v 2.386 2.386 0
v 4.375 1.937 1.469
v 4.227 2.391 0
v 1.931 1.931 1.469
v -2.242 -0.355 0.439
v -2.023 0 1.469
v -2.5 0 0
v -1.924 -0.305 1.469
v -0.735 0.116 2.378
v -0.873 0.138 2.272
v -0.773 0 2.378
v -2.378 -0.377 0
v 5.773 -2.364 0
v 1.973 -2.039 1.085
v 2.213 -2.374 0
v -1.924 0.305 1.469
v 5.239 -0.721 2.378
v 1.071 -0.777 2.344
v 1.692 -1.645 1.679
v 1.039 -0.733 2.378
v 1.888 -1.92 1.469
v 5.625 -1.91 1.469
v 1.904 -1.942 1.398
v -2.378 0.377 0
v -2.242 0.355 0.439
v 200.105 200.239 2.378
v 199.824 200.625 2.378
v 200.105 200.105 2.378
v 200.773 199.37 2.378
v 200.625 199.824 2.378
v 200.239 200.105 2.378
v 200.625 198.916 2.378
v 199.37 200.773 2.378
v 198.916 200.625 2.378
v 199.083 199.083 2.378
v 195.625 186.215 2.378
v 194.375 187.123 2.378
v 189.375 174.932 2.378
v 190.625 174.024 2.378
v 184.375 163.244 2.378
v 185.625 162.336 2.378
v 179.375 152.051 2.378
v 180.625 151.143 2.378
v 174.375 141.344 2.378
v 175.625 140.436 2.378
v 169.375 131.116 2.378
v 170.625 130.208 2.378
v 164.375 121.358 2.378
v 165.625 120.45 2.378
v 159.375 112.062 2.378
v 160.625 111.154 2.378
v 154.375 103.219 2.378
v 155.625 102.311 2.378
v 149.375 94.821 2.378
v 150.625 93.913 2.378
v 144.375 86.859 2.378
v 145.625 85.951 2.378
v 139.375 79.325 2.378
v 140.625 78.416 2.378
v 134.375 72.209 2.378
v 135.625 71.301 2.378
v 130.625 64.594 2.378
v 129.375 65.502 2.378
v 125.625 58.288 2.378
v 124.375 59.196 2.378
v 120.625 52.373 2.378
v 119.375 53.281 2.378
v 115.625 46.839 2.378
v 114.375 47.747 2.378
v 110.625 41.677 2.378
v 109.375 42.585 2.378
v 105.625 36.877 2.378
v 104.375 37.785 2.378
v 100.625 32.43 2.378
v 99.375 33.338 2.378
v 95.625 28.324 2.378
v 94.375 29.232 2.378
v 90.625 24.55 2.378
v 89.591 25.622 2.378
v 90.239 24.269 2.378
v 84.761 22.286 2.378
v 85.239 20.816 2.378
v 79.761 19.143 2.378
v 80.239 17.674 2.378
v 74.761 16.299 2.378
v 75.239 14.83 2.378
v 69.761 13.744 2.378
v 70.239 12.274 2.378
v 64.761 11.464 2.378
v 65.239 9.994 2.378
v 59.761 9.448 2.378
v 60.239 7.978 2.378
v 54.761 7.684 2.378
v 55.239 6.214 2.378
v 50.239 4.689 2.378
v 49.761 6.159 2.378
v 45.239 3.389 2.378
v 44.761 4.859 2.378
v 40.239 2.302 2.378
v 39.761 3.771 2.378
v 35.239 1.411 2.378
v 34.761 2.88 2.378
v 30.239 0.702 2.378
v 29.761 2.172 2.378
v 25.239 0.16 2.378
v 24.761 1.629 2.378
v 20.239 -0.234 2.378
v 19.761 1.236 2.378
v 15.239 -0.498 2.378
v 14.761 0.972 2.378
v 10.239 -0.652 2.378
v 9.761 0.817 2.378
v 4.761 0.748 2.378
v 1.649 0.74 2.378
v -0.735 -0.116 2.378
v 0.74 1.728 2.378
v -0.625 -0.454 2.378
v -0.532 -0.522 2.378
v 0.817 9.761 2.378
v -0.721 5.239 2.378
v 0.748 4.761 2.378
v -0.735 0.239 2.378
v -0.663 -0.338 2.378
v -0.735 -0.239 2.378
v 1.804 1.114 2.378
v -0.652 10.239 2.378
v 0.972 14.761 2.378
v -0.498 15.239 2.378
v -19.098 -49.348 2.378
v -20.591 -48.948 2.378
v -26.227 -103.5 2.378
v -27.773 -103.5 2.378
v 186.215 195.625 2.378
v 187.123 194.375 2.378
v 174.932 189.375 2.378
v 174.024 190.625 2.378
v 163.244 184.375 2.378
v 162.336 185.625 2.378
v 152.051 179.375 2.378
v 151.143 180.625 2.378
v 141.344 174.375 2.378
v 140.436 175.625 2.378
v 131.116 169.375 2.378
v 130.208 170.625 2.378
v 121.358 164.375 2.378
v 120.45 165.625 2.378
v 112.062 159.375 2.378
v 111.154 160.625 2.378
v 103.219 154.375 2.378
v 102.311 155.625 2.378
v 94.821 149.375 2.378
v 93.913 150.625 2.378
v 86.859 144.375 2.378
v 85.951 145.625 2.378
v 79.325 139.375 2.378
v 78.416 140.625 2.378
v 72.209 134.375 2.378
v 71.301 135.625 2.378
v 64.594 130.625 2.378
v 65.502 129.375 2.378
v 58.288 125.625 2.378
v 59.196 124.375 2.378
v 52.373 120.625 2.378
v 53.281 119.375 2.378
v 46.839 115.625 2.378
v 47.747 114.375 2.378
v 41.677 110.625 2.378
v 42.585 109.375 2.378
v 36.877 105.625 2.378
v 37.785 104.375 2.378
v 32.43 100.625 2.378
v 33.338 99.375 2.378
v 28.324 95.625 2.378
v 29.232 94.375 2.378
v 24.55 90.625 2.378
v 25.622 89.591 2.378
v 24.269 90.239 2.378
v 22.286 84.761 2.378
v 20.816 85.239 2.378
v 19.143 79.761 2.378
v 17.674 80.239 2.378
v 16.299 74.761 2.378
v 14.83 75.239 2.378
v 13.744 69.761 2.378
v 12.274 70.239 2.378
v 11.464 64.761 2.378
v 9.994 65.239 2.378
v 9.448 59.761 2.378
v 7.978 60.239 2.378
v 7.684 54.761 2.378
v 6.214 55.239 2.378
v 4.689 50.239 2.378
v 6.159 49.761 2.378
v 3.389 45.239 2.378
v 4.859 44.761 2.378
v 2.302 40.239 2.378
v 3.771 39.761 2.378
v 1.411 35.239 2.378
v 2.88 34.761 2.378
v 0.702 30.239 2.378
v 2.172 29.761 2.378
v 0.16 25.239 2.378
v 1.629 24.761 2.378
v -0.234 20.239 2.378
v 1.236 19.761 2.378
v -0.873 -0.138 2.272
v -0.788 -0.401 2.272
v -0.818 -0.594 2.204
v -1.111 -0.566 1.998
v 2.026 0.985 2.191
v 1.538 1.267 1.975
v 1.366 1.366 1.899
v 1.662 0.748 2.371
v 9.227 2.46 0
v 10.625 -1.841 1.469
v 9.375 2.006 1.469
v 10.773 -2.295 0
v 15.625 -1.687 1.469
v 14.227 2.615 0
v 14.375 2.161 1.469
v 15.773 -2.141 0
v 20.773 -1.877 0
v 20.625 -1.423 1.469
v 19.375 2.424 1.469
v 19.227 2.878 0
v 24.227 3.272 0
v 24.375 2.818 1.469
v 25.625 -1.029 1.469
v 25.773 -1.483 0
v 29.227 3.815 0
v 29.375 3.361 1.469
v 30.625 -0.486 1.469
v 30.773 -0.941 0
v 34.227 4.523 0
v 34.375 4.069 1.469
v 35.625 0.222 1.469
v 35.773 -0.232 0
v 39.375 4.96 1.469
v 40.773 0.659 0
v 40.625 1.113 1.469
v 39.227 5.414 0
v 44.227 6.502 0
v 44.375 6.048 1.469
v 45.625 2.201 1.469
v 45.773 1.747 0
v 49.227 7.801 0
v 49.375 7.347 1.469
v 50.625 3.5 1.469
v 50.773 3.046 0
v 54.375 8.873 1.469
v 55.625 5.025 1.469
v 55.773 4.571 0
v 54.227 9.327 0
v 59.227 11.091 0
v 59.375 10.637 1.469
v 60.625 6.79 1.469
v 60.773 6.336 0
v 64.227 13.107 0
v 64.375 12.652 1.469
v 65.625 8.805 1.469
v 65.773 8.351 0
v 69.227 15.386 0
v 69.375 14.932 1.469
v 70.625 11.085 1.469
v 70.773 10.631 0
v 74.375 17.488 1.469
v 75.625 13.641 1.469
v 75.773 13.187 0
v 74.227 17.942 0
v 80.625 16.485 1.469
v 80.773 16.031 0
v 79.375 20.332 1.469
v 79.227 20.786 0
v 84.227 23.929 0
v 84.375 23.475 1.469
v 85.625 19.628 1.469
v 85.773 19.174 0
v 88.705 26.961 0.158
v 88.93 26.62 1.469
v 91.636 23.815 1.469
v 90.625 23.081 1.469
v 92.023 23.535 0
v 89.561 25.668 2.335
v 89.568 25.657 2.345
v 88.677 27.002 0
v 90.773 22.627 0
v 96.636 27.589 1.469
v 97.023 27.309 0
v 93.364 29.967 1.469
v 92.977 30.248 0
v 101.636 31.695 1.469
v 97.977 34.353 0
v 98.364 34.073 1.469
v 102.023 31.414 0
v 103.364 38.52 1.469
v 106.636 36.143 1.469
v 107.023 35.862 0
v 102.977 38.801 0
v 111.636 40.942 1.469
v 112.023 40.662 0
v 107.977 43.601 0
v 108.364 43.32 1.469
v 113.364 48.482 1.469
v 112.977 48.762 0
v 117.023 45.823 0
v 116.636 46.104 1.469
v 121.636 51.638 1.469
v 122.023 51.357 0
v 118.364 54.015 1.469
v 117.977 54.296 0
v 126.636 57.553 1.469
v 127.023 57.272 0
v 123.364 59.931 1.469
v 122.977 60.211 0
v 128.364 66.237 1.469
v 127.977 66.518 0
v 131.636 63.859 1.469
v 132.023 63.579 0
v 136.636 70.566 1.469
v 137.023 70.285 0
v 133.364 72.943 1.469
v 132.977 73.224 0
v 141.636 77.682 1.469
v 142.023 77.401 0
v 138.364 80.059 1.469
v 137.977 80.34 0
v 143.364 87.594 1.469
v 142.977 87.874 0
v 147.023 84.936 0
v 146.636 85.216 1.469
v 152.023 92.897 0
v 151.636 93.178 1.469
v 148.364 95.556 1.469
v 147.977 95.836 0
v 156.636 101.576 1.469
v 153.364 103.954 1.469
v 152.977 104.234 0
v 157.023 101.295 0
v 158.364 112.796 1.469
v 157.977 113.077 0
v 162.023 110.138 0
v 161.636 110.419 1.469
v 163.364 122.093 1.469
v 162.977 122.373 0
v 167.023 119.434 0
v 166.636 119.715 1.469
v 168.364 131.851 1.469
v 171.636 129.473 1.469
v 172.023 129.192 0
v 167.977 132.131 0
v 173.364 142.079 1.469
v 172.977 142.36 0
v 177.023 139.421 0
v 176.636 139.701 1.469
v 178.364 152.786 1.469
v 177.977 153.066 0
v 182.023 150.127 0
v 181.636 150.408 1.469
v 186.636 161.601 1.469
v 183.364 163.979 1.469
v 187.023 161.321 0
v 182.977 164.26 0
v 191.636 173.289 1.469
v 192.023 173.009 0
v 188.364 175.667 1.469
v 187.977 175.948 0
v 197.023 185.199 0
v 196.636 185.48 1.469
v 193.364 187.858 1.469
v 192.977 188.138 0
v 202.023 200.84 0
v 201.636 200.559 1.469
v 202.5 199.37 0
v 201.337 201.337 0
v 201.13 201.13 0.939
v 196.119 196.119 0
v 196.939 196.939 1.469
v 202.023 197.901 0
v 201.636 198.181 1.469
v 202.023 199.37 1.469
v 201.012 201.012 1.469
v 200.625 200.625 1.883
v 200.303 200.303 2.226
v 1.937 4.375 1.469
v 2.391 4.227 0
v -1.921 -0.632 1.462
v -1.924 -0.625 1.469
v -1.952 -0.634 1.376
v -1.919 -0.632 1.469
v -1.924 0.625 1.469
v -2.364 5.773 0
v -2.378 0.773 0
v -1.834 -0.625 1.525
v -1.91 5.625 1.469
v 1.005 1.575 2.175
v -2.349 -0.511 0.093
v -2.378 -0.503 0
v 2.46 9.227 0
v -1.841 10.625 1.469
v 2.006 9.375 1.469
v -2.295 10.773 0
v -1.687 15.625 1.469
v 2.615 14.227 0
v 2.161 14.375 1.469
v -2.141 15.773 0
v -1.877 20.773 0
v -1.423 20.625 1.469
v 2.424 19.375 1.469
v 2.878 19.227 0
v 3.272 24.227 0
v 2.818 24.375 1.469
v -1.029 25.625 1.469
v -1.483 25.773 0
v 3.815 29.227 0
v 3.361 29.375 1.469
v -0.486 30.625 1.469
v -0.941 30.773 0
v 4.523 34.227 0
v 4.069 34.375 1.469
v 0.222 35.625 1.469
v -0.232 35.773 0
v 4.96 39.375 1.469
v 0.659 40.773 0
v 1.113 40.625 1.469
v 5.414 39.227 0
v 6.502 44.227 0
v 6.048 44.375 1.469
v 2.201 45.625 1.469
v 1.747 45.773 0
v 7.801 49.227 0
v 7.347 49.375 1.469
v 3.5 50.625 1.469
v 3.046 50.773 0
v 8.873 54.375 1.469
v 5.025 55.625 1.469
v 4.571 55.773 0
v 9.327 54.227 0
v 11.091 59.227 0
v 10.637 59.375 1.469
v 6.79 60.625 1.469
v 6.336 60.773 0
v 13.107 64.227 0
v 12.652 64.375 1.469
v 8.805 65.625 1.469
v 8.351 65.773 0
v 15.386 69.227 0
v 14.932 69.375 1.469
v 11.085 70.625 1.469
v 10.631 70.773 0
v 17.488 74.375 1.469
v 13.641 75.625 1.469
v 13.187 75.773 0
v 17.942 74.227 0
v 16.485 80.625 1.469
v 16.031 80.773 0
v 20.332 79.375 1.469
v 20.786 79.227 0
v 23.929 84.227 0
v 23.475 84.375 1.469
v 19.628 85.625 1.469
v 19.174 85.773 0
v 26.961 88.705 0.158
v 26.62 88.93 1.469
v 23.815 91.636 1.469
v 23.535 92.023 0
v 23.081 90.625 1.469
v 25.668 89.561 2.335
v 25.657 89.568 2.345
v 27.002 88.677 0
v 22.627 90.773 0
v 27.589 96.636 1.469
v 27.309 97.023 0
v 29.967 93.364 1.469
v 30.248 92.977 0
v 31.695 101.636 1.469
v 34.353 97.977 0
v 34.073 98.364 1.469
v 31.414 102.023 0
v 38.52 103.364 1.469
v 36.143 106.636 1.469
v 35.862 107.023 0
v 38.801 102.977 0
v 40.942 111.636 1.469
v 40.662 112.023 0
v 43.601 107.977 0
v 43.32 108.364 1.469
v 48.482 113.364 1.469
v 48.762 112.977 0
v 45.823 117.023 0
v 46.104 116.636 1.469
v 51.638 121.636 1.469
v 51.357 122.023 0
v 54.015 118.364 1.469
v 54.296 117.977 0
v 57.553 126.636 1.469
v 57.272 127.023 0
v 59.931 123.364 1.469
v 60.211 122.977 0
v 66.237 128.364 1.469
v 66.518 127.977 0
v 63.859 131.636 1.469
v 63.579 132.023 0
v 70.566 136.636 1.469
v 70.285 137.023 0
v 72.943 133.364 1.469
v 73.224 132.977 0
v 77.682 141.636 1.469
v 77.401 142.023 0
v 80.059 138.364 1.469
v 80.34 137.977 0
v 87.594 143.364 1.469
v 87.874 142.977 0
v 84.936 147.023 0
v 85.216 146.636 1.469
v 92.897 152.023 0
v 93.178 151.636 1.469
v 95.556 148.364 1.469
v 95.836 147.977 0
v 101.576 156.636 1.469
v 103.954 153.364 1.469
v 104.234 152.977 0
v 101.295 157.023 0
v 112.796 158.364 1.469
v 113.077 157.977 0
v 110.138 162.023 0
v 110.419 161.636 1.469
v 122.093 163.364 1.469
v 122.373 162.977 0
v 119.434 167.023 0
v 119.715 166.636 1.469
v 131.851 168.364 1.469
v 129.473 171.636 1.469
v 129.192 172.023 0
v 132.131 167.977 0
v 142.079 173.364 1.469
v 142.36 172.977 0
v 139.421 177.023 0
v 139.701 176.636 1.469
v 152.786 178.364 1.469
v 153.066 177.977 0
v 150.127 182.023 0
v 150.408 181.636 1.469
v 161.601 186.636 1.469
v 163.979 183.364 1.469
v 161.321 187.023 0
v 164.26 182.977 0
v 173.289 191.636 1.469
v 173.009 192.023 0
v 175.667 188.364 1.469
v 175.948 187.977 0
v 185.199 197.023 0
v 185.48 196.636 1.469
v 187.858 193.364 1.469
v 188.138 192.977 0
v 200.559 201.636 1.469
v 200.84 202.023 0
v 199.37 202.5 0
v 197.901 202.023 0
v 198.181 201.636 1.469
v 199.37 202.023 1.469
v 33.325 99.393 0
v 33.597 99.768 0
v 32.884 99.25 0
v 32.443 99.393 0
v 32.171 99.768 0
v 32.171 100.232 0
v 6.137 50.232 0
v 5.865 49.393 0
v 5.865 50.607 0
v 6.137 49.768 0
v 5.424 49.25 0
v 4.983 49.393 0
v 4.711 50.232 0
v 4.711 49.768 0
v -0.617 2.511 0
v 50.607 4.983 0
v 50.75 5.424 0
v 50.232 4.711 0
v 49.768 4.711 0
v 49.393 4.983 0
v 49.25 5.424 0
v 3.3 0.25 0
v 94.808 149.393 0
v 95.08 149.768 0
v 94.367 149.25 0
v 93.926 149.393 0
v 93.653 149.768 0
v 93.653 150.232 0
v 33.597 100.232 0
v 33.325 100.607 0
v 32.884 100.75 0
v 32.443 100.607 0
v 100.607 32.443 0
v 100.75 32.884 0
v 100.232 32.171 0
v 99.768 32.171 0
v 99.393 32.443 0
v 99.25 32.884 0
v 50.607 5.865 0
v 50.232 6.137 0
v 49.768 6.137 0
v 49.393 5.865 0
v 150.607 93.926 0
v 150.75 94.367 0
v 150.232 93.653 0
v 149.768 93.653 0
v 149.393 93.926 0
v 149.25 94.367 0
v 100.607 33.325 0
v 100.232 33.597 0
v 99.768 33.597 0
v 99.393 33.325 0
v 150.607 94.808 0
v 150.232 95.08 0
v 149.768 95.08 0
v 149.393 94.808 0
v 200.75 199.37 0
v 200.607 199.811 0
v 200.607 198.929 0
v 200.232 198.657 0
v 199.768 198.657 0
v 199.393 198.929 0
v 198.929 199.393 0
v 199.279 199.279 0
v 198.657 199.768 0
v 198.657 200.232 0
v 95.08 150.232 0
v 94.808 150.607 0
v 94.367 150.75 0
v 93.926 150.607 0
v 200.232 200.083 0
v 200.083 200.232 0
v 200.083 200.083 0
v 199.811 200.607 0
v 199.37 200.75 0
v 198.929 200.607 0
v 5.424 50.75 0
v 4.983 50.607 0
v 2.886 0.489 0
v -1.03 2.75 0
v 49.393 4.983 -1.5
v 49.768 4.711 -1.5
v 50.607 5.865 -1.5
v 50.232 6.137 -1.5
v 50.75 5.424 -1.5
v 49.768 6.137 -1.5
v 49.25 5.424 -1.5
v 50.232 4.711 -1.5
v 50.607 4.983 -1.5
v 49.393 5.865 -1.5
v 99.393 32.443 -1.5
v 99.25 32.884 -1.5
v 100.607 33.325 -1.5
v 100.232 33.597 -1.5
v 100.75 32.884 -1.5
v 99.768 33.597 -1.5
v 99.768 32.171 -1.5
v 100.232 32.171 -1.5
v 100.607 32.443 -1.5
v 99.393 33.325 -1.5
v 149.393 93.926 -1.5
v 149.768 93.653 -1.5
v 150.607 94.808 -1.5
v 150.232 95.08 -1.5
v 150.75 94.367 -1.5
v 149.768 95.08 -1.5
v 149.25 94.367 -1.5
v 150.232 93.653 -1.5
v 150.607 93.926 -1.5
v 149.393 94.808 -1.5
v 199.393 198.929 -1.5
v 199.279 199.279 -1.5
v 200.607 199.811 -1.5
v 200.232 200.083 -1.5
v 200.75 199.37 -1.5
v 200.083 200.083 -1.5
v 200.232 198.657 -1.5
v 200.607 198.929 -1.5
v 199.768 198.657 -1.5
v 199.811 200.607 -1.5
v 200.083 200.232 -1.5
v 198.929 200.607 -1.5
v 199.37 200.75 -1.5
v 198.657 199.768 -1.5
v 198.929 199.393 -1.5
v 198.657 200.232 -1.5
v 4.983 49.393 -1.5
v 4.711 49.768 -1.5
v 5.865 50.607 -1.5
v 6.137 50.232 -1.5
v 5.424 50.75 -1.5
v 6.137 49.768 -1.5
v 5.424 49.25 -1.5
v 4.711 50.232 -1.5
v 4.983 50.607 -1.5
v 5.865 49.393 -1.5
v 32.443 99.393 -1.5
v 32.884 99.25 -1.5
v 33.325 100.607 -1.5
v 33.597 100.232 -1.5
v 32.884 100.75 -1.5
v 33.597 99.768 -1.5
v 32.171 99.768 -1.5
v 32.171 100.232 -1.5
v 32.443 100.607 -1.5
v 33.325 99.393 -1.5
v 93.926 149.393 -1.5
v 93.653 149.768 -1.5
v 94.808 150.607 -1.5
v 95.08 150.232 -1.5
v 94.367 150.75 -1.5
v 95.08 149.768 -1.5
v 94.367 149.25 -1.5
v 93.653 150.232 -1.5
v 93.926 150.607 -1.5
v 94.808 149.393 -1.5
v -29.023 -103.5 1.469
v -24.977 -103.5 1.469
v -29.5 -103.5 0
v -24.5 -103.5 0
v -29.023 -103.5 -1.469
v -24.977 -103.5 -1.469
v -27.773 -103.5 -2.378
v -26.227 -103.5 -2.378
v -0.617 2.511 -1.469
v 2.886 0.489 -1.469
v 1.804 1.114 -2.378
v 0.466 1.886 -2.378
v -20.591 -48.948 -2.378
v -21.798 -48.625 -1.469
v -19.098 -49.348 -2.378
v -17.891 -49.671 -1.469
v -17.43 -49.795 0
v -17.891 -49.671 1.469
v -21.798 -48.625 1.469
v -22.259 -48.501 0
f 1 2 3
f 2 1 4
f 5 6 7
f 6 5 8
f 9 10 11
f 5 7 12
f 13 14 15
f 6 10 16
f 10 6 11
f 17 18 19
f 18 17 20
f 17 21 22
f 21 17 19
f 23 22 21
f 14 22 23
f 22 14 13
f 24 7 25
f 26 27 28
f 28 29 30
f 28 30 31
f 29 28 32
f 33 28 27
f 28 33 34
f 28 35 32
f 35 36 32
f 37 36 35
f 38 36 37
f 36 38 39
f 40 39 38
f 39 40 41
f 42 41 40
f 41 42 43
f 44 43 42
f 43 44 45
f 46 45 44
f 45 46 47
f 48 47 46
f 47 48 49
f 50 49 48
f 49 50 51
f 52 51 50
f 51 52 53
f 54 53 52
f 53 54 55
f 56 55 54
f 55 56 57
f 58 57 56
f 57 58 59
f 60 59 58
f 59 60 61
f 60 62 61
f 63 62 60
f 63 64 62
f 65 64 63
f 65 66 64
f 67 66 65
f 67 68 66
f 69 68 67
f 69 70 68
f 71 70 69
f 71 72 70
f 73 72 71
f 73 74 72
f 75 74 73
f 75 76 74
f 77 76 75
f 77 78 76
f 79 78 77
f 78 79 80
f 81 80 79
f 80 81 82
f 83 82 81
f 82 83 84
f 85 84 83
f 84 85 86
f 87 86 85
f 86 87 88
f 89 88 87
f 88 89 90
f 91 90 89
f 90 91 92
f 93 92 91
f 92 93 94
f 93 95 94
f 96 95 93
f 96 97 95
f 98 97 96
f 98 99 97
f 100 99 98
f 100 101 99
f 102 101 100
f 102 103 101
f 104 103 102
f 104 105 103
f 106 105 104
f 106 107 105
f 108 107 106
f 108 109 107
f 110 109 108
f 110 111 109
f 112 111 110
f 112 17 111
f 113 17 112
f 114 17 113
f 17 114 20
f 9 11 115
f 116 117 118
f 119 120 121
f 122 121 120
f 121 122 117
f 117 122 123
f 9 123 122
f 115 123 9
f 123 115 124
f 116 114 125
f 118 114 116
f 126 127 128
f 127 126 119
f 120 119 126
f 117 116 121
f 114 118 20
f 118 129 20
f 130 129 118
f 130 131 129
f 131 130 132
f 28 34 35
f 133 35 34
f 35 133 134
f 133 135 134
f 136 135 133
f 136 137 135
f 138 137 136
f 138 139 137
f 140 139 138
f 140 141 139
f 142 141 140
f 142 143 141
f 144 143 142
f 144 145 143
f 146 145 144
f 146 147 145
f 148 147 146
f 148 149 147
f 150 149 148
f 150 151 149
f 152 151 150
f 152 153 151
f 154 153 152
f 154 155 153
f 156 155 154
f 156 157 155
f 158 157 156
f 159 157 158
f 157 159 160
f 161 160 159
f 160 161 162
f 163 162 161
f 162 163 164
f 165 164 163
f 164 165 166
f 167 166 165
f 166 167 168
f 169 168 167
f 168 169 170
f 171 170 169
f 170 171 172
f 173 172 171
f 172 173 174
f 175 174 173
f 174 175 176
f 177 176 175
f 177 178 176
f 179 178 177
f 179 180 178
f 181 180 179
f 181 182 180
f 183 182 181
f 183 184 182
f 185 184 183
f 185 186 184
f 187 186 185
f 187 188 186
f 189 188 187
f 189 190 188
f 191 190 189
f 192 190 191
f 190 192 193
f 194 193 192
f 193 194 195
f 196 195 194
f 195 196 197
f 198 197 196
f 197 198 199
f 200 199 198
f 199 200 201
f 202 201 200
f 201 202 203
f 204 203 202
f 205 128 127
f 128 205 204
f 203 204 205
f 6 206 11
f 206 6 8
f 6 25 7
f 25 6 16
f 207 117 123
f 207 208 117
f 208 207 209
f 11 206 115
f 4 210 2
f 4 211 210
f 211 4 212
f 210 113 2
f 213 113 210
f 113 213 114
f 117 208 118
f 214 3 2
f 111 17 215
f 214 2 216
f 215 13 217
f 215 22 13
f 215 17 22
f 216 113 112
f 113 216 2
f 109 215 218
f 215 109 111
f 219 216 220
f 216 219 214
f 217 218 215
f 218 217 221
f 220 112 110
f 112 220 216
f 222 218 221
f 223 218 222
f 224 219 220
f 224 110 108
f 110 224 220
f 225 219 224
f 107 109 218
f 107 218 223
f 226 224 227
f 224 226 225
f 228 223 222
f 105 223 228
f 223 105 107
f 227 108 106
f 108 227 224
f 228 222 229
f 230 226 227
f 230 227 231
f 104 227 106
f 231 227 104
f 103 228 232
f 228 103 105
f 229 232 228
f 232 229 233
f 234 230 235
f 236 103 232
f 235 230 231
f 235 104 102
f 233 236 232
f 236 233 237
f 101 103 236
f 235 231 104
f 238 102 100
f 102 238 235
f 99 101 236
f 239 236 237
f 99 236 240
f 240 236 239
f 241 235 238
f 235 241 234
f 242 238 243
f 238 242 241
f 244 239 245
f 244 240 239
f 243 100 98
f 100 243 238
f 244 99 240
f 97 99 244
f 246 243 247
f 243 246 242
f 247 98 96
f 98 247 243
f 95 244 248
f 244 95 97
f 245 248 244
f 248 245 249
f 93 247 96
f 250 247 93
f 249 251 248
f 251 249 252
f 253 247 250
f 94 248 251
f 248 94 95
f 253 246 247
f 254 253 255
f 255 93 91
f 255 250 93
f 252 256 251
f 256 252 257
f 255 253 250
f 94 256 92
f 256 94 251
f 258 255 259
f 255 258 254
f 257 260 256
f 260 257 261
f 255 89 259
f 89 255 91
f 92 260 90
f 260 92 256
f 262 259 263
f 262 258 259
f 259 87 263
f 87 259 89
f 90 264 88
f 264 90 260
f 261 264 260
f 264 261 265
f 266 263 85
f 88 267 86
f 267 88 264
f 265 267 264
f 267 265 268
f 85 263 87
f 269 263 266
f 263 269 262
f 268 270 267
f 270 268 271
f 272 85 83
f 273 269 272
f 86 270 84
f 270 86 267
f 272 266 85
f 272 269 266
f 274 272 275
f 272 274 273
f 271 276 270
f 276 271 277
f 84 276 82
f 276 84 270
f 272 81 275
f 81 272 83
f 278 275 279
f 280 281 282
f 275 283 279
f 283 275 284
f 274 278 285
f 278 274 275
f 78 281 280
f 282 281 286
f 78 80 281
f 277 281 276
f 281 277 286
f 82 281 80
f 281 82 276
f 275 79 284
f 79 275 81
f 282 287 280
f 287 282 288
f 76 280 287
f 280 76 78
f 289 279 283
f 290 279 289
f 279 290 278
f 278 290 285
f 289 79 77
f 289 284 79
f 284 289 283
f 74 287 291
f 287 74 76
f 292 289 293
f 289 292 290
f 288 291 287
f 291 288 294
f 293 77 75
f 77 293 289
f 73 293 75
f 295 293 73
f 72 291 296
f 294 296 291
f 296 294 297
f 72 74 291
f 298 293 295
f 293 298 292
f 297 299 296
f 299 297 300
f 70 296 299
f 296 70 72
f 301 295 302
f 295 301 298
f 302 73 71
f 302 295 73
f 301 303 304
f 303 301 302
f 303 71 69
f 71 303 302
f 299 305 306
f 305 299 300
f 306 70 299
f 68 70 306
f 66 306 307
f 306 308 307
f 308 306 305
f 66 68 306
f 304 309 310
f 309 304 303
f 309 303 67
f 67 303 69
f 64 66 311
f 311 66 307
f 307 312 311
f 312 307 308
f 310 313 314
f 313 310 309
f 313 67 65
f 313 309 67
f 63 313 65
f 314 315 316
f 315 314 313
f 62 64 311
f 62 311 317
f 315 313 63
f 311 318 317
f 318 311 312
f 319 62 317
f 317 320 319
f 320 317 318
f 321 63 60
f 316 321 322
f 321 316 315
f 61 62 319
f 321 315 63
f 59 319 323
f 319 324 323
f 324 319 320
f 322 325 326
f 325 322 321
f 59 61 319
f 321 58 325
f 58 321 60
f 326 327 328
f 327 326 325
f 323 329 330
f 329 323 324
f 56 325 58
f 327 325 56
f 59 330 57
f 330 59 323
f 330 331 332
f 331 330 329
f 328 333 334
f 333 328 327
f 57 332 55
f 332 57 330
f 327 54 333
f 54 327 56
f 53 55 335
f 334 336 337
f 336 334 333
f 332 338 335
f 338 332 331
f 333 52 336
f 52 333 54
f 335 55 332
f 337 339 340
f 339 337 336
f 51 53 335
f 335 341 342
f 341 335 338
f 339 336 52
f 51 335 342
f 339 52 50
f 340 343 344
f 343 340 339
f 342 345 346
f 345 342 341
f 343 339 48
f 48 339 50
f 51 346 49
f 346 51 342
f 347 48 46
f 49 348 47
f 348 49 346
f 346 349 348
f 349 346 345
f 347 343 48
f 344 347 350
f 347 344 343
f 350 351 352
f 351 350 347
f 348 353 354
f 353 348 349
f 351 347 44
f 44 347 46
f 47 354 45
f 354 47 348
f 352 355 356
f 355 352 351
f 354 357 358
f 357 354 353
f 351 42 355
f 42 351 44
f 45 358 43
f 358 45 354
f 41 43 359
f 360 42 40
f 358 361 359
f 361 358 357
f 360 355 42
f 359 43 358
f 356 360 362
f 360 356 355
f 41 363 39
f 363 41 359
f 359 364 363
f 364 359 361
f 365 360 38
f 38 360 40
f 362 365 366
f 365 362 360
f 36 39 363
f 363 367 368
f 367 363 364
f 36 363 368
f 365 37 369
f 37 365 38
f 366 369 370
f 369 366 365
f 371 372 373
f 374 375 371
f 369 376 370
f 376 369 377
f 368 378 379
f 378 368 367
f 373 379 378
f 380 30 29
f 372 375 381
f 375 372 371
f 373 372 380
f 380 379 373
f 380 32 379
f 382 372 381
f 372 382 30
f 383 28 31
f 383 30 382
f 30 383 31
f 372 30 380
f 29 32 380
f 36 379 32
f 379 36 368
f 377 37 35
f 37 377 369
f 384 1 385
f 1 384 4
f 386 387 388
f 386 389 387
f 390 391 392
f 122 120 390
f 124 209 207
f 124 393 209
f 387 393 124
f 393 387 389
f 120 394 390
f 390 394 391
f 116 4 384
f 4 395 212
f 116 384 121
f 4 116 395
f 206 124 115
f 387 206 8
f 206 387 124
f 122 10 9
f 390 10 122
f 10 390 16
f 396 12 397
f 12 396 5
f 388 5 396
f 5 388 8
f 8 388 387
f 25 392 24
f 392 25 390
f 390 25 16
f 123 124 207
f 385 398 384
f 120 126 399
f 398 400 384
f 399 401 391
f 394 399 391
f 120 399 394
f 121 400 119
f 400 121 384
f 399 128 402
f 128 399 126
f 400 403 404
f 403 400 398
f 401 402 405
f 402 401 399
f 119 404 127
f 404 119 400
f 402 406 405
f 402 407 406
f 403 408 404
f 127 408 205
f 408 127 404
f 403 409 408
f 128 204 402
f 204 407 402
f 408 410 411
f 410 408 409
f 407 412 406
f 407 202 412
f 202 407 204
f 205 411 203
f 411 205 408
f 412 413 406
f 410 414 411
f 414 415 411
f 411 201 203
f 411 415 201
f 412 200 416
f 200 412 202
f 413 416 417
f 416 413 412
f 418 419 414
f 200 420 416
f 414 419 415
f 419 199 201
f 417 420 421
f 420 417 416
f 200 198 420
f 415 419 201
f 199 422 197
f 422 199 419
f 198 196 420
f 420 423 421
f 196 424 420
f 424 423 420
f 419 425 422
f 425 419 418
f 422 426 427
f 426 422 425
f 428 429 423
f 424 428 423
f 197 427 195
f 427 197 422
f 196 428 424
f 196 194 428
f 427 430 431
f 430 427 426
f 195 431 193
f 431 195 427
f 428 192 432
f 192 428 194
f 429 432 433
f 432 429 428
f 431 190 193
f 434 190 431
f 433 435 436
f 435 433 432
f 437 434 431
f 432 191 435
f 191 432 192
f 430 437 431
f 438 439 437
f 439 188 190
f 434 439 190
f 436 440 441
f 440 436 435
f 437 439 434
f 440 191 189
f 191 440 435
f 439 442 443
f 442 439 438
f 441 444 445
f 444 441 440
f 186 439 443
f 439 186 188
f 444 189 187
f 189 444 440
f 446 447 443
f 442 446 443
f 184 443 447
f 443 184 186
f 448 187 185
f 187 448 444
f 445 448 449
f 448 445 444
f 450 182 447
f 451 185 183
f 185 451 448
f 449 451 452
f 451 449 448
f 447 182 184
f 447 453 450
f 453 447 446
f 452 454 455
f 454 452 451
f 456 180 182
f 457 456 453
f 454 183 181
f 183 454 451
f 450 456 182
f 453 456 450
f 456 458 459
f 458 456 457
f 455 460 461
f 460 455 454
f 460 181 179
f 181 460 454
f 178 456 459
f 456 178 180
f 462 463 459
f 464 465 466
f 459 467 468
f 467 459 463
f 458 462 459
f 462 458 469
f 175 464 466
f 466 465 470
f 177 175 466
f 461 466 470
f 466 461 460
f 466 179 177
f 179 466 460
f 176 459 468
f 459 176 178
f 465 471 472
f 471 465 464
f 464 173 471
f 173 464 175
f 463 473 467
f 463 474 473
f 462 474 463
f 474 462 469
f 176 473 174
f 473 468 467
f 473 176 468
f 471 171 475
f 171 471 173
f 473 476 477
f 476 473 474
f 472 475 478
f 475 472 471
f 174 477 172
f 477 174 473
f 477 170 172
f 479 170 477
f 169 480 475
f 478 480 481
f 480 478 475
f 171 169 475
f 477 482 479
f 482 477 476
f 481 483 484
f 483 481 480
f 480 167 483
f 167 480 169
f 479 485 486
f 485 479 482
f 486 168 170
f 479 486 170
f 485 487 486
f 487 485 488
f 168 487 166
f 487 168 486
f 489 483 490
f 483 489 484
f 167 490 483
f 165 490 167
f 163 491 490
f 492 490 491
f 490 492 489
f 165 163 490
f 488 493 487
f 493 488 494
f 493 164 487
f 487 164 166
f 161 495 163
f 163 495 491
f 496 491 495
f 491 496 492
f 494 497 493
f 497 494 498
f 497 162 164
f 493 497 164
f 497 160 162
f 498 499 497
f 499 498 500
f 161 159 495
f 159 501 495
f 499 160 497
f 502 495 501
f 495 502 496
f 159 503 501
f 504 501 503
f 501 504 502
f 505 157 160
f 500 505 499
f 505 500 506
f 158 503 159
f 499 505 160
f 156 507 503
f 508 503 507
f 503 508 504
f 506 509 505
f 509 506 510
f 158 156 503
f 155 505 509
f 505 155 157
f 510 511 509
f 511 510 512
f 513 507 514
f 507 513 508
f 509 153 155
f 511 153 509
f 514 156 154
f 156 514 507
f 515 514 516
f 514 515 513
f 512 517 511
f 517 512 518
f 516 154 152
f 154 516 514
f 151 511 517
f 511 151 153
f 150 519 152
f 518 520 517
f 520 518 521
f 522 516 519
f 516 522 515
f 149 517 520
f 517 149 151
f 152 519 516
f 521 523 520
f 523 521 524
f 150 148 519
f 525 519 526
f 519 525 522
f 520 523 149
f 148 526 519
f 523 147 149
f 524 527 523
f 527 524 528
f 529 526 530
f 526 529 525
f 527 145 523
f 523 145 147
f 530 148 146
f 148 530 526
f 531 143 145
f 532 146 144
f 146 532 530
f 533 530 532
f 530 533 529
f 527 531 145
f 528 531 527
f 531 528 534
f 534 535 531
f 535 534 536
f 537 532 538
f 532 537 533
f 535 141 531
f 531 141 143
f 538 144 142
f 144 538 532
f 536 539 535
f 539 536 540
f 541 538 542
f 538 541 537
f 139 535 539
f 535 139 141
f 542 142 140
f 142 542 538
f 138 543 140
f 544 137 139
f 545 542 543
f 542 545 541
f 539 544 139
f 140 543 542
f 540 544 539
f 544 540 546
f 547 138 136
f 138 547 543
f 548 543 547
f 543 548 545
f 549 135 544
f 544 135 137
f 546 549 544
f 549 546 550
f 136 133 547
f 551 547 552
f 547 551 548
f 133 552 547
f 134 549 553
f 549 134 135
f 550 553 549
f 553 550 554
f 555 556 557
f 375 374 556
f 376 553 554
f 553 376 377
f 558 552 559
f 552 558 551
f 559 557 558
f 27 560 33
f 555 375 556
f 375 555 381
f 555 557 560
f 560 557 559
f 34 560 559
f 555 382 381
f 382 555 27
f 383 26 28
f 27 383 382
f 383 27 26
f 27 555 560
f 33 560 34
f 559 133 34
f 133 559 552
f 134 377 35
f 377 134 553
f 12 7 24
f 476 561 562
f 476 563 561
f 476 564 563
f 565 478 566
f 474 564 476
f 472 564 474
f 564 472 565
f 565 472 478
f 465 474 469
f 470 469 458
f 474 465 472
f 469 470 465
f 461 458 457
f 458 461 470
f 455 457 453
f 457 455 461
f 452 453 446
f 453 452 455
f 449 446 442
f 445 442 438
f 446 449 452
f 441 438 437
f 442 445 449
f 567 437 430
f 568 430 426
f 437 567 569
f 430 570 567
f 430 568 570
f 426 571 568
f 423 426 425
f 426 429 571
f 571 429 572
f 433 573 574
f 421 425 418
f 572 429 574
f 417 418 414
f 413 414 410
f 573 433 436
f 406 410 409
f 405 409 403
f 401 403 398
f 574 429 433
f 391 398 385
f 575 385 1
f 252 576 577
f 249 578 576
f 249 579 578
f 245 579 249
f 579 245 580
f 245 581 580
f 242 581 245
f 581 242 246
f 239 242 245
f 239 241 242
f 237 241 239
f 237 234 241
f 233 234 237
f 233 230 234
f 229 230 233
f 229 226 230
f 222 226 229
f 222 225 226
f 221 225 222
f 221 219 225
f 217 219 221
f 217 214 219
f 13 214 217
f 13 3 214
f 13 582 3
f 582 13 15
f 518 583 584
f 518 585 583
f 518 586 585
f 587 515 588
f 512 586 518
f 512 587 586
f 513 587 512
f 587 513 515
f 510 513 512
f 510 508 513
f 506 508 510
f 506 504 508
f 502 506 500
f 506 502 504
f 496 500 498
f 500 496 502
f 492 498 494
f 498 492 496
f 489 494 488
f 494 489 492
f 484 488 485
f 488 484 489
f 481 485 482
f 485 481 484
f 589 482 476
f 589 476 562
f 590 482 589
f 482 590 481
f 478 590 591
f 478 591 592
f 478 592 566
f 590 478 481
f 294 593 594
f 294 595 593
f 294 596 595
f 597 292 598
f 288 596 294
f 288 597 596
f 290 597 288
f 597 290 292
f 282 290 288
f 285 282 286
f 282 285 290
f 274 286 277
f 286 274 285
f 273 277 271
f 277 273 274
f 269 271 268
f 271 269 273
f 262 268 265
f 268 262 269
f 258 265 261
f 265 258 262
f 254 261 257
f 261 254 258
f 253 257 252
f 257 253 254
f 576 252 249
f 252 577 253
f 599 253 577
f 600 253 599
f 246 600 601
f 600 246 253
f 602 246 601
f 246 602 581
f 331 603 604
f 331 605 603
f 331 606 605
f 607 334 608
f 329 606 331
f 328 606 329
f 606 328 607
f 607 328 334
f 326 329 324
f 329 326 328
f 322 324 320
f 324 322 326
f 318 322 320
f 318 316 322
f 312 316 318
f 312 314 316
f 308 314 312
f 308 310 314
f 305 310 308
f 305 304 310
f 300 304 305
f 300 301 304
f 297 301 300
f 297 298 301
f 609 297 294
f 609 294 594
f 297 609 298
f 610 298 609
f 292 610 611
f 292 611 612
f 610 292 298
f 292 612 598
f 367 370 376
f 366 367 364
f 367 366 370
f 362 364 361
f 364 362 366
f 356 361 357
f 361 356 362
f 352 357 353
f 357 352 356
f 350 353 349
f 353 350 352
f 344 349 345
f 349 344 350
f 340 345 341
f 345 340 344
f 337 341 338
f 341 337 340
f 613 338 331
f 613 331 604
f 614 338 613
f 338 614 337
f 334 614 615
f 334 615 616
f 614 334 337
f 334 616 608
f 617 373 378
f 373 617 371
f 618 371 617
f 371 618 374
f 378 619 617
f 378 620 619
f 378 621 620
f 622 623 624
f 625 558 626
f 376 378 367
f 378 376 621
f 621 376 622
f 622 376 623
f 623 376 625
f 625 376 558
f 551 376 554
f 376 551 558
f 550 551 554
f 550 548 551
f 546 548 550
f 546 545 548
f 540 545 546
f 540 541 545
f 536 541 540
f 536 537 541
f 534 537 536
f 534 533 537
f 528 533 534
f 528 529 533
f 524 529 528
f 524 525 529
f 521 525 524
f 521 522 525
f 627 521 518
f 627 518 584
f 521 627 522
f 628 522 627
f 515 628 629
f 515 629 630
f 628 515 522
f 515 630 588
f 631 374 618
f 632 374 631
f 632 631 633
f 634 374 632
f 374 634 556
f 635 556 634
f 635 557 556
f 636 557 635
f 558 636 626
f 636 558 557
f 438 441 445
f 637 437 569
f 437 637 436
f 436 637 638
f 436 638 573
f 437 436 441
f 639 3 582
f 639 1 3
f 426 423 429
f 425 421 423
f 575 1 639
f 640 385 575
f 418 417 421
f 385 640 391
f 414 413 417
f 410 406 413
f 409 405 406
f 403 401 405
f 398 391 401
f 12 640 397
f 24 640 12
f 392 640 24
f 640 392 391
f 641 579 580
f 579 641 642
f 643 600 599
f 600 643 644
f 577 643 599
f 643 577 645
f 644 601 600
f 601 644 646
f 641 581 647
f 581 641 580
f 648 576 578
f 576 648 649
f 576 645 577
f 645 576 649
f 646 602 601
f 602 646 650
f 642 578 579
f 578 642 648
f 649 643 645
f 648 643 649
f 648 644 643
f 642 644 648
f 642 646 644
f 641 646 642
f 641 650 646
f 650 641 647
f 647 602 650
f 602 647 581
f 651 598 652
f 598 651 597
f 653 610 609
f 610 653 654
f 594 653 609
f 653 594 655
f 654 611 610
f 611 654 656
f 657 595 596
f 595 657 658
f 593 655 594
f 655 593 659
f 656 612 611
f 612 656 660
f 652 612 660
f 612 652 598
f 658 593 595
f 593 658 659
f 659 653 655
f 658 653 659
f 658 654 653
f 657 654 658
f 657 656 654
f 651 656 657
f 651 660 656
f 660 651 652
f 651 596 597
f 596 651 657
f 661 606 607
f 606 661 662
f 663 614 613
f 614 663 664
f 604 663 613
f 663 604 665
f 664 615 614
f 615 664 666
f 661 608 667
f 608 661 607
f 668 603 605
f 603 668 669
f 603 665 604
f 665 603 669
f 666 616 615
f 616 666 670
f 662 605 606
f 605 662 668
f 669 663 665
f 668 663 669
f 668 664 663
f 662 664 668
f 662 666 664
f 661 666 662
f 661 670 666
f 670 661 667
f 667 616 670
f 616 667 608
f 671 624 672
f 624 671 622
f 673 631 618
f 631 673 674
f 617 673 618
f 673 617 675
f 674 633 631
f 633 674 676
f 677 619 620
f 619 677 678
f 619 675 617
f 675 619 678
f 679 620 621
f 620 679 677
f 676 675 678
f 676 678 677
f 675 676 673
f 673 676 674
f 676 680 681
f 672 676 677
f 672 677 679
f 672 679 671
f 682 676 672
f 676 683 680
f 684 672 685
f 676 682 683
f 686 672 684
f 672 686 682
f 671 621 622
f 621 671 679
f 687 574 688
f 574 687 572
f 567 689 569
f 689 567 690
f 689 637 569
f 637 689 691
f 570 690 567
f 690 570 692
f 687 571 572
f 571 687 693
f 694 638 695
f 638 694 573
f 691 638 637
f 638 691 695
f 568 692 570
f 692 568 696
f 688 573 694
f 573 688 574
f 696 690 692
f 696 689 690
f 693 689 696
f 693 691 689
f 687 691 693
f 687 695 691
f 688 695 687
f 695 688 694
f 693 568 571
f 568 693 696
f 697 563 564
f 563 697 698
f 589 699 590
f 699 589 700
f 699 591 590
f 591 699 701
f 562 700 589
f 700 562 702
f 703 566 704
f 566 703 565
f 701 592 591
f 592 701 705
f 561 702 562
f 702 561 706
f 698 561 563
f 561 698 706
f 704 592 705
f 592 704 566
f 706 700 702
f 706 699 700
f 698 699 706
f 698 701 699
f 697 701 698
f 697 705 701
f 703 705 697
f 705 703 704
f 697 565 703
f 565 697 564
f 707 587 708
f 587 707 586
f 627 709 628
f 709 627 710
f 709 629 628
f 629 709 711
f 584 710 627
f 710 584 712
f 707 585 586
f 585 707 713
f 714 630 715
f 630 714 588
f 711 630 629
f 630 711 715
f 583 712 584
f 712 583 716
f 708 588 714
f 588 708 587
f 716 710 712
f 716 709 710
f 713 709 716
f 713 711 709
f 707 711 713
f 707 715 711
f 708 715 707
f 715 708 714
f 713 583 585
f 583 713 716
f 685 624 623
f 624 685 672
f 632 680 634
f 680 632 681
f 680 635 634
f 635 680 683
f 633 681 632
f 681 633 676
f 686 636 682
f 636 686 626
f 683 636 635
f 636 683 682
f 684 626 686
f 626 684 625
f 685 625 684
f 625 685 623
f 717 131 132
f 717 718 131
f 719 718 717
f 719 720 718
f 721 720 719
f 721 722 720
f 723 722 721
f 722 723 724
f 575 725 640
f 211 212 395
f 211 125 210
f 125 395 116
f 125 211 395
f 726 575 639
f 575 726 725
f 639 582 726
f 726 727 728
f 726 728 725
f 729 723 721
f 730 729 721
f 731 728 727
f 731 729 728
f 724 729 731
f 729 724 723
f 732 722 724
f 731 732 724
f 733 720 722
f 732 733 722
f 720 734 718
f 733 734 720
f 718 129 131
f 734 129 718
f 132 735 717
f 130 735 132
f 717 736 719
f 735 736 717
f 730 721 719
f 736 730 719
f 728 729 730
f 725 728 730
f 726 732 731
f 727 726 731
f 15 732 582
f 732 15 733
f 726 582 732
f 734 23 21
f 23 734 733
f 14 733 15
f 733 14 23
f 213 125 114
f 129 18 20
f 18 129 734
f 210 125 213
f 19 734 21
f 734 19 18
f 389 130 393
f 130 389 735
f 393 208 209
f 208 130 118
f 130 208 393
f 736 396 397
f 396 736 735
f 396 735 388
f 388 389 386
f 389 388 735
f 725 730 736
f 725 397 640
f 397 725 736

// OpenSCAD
resolution = 10;
module edge(){  
    for (x=[0:39]){
        y = x^2.6/367;
        hull(){
        translate([x,y])
//            circle
            sphere(d=1,$fn=resolution);
        x2 = x+1;
        y2 = (x+1)^2.6/367;
        translate([x2,y2])
//            circle
            sphere(d=1,$fn=resolution); 
        }
    }
}

module leaf(){
    difference(){
        union(){    
            edge();
            mirror([-1,1]) 
                edge(); 
        }
        translate([0,0,-50])
            cube(100,center=true);
    }
}

module pegset(){
        for (i=[0,10,20,30,40]){
        j = i^2.6/367;
        pegresolution = .3;
        holeresolution = .6;
        translate([i,j,0])
            cylinder(h=.6,center=true,$fn=resolution,d=pegresolution);
    }
}
//scale([5,5,5])
//leaf();

//mirror([1,1,0])
scale([5,5,5])
union()
{
    leaf();
    pegset();
    mirror([-1,1])
        pegset();  
translate([36.6,-20.7,0])
mirror([1,1,0])
rotate([0,0,90])
rotate_extrude(convexity = 10,angle=30)
translate([42, 0, 0])
circle(d = 1, $fn=resolution);
}
